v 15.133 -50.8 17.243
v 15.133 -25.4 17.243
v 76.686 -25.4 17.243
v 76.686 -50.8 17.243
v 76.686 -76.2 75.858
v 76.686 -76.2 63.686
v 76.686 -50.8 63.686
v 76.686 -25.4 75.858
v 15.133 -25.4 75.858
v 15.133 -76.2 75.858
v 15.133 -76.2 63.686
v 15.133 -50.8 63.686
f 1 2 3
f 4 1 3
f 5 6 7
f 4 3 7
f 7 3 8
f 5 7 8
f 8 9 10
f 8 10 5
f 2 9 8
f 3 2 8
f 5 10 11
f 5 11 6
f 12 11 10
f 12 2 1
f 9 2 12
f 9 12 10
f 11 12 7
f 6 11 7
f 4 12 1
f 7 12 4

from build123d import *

# Parameters (mm, degrees)
F1_W     = 61.55309
F1_H     = 58.615133
F2_DEPTH = 25.4
F3_W     = 61.55309
F3_H     = 12.171417
F4_DEPTH = 25.4


with BuildPart() as f2:
    # F1 (on offset) → F2 (new body)
    with BuildSketch(Plane.XZ.offset(25.4)):
        with Locations((45.909398, 46.550103)):
            Rectangle(F1_W, F1_H)
    extrude(amount=F2_DEPTH)

    # F3 (on face) → F4 (join)
    with BuildSketch(Plane.XZ.offset(50.8)):
        with Locations((45.909398, 69.771961)):
            Rectangle(F3_W, F3_H)
    extrude(amount=F4_DEPTH)


solid = f2.part
